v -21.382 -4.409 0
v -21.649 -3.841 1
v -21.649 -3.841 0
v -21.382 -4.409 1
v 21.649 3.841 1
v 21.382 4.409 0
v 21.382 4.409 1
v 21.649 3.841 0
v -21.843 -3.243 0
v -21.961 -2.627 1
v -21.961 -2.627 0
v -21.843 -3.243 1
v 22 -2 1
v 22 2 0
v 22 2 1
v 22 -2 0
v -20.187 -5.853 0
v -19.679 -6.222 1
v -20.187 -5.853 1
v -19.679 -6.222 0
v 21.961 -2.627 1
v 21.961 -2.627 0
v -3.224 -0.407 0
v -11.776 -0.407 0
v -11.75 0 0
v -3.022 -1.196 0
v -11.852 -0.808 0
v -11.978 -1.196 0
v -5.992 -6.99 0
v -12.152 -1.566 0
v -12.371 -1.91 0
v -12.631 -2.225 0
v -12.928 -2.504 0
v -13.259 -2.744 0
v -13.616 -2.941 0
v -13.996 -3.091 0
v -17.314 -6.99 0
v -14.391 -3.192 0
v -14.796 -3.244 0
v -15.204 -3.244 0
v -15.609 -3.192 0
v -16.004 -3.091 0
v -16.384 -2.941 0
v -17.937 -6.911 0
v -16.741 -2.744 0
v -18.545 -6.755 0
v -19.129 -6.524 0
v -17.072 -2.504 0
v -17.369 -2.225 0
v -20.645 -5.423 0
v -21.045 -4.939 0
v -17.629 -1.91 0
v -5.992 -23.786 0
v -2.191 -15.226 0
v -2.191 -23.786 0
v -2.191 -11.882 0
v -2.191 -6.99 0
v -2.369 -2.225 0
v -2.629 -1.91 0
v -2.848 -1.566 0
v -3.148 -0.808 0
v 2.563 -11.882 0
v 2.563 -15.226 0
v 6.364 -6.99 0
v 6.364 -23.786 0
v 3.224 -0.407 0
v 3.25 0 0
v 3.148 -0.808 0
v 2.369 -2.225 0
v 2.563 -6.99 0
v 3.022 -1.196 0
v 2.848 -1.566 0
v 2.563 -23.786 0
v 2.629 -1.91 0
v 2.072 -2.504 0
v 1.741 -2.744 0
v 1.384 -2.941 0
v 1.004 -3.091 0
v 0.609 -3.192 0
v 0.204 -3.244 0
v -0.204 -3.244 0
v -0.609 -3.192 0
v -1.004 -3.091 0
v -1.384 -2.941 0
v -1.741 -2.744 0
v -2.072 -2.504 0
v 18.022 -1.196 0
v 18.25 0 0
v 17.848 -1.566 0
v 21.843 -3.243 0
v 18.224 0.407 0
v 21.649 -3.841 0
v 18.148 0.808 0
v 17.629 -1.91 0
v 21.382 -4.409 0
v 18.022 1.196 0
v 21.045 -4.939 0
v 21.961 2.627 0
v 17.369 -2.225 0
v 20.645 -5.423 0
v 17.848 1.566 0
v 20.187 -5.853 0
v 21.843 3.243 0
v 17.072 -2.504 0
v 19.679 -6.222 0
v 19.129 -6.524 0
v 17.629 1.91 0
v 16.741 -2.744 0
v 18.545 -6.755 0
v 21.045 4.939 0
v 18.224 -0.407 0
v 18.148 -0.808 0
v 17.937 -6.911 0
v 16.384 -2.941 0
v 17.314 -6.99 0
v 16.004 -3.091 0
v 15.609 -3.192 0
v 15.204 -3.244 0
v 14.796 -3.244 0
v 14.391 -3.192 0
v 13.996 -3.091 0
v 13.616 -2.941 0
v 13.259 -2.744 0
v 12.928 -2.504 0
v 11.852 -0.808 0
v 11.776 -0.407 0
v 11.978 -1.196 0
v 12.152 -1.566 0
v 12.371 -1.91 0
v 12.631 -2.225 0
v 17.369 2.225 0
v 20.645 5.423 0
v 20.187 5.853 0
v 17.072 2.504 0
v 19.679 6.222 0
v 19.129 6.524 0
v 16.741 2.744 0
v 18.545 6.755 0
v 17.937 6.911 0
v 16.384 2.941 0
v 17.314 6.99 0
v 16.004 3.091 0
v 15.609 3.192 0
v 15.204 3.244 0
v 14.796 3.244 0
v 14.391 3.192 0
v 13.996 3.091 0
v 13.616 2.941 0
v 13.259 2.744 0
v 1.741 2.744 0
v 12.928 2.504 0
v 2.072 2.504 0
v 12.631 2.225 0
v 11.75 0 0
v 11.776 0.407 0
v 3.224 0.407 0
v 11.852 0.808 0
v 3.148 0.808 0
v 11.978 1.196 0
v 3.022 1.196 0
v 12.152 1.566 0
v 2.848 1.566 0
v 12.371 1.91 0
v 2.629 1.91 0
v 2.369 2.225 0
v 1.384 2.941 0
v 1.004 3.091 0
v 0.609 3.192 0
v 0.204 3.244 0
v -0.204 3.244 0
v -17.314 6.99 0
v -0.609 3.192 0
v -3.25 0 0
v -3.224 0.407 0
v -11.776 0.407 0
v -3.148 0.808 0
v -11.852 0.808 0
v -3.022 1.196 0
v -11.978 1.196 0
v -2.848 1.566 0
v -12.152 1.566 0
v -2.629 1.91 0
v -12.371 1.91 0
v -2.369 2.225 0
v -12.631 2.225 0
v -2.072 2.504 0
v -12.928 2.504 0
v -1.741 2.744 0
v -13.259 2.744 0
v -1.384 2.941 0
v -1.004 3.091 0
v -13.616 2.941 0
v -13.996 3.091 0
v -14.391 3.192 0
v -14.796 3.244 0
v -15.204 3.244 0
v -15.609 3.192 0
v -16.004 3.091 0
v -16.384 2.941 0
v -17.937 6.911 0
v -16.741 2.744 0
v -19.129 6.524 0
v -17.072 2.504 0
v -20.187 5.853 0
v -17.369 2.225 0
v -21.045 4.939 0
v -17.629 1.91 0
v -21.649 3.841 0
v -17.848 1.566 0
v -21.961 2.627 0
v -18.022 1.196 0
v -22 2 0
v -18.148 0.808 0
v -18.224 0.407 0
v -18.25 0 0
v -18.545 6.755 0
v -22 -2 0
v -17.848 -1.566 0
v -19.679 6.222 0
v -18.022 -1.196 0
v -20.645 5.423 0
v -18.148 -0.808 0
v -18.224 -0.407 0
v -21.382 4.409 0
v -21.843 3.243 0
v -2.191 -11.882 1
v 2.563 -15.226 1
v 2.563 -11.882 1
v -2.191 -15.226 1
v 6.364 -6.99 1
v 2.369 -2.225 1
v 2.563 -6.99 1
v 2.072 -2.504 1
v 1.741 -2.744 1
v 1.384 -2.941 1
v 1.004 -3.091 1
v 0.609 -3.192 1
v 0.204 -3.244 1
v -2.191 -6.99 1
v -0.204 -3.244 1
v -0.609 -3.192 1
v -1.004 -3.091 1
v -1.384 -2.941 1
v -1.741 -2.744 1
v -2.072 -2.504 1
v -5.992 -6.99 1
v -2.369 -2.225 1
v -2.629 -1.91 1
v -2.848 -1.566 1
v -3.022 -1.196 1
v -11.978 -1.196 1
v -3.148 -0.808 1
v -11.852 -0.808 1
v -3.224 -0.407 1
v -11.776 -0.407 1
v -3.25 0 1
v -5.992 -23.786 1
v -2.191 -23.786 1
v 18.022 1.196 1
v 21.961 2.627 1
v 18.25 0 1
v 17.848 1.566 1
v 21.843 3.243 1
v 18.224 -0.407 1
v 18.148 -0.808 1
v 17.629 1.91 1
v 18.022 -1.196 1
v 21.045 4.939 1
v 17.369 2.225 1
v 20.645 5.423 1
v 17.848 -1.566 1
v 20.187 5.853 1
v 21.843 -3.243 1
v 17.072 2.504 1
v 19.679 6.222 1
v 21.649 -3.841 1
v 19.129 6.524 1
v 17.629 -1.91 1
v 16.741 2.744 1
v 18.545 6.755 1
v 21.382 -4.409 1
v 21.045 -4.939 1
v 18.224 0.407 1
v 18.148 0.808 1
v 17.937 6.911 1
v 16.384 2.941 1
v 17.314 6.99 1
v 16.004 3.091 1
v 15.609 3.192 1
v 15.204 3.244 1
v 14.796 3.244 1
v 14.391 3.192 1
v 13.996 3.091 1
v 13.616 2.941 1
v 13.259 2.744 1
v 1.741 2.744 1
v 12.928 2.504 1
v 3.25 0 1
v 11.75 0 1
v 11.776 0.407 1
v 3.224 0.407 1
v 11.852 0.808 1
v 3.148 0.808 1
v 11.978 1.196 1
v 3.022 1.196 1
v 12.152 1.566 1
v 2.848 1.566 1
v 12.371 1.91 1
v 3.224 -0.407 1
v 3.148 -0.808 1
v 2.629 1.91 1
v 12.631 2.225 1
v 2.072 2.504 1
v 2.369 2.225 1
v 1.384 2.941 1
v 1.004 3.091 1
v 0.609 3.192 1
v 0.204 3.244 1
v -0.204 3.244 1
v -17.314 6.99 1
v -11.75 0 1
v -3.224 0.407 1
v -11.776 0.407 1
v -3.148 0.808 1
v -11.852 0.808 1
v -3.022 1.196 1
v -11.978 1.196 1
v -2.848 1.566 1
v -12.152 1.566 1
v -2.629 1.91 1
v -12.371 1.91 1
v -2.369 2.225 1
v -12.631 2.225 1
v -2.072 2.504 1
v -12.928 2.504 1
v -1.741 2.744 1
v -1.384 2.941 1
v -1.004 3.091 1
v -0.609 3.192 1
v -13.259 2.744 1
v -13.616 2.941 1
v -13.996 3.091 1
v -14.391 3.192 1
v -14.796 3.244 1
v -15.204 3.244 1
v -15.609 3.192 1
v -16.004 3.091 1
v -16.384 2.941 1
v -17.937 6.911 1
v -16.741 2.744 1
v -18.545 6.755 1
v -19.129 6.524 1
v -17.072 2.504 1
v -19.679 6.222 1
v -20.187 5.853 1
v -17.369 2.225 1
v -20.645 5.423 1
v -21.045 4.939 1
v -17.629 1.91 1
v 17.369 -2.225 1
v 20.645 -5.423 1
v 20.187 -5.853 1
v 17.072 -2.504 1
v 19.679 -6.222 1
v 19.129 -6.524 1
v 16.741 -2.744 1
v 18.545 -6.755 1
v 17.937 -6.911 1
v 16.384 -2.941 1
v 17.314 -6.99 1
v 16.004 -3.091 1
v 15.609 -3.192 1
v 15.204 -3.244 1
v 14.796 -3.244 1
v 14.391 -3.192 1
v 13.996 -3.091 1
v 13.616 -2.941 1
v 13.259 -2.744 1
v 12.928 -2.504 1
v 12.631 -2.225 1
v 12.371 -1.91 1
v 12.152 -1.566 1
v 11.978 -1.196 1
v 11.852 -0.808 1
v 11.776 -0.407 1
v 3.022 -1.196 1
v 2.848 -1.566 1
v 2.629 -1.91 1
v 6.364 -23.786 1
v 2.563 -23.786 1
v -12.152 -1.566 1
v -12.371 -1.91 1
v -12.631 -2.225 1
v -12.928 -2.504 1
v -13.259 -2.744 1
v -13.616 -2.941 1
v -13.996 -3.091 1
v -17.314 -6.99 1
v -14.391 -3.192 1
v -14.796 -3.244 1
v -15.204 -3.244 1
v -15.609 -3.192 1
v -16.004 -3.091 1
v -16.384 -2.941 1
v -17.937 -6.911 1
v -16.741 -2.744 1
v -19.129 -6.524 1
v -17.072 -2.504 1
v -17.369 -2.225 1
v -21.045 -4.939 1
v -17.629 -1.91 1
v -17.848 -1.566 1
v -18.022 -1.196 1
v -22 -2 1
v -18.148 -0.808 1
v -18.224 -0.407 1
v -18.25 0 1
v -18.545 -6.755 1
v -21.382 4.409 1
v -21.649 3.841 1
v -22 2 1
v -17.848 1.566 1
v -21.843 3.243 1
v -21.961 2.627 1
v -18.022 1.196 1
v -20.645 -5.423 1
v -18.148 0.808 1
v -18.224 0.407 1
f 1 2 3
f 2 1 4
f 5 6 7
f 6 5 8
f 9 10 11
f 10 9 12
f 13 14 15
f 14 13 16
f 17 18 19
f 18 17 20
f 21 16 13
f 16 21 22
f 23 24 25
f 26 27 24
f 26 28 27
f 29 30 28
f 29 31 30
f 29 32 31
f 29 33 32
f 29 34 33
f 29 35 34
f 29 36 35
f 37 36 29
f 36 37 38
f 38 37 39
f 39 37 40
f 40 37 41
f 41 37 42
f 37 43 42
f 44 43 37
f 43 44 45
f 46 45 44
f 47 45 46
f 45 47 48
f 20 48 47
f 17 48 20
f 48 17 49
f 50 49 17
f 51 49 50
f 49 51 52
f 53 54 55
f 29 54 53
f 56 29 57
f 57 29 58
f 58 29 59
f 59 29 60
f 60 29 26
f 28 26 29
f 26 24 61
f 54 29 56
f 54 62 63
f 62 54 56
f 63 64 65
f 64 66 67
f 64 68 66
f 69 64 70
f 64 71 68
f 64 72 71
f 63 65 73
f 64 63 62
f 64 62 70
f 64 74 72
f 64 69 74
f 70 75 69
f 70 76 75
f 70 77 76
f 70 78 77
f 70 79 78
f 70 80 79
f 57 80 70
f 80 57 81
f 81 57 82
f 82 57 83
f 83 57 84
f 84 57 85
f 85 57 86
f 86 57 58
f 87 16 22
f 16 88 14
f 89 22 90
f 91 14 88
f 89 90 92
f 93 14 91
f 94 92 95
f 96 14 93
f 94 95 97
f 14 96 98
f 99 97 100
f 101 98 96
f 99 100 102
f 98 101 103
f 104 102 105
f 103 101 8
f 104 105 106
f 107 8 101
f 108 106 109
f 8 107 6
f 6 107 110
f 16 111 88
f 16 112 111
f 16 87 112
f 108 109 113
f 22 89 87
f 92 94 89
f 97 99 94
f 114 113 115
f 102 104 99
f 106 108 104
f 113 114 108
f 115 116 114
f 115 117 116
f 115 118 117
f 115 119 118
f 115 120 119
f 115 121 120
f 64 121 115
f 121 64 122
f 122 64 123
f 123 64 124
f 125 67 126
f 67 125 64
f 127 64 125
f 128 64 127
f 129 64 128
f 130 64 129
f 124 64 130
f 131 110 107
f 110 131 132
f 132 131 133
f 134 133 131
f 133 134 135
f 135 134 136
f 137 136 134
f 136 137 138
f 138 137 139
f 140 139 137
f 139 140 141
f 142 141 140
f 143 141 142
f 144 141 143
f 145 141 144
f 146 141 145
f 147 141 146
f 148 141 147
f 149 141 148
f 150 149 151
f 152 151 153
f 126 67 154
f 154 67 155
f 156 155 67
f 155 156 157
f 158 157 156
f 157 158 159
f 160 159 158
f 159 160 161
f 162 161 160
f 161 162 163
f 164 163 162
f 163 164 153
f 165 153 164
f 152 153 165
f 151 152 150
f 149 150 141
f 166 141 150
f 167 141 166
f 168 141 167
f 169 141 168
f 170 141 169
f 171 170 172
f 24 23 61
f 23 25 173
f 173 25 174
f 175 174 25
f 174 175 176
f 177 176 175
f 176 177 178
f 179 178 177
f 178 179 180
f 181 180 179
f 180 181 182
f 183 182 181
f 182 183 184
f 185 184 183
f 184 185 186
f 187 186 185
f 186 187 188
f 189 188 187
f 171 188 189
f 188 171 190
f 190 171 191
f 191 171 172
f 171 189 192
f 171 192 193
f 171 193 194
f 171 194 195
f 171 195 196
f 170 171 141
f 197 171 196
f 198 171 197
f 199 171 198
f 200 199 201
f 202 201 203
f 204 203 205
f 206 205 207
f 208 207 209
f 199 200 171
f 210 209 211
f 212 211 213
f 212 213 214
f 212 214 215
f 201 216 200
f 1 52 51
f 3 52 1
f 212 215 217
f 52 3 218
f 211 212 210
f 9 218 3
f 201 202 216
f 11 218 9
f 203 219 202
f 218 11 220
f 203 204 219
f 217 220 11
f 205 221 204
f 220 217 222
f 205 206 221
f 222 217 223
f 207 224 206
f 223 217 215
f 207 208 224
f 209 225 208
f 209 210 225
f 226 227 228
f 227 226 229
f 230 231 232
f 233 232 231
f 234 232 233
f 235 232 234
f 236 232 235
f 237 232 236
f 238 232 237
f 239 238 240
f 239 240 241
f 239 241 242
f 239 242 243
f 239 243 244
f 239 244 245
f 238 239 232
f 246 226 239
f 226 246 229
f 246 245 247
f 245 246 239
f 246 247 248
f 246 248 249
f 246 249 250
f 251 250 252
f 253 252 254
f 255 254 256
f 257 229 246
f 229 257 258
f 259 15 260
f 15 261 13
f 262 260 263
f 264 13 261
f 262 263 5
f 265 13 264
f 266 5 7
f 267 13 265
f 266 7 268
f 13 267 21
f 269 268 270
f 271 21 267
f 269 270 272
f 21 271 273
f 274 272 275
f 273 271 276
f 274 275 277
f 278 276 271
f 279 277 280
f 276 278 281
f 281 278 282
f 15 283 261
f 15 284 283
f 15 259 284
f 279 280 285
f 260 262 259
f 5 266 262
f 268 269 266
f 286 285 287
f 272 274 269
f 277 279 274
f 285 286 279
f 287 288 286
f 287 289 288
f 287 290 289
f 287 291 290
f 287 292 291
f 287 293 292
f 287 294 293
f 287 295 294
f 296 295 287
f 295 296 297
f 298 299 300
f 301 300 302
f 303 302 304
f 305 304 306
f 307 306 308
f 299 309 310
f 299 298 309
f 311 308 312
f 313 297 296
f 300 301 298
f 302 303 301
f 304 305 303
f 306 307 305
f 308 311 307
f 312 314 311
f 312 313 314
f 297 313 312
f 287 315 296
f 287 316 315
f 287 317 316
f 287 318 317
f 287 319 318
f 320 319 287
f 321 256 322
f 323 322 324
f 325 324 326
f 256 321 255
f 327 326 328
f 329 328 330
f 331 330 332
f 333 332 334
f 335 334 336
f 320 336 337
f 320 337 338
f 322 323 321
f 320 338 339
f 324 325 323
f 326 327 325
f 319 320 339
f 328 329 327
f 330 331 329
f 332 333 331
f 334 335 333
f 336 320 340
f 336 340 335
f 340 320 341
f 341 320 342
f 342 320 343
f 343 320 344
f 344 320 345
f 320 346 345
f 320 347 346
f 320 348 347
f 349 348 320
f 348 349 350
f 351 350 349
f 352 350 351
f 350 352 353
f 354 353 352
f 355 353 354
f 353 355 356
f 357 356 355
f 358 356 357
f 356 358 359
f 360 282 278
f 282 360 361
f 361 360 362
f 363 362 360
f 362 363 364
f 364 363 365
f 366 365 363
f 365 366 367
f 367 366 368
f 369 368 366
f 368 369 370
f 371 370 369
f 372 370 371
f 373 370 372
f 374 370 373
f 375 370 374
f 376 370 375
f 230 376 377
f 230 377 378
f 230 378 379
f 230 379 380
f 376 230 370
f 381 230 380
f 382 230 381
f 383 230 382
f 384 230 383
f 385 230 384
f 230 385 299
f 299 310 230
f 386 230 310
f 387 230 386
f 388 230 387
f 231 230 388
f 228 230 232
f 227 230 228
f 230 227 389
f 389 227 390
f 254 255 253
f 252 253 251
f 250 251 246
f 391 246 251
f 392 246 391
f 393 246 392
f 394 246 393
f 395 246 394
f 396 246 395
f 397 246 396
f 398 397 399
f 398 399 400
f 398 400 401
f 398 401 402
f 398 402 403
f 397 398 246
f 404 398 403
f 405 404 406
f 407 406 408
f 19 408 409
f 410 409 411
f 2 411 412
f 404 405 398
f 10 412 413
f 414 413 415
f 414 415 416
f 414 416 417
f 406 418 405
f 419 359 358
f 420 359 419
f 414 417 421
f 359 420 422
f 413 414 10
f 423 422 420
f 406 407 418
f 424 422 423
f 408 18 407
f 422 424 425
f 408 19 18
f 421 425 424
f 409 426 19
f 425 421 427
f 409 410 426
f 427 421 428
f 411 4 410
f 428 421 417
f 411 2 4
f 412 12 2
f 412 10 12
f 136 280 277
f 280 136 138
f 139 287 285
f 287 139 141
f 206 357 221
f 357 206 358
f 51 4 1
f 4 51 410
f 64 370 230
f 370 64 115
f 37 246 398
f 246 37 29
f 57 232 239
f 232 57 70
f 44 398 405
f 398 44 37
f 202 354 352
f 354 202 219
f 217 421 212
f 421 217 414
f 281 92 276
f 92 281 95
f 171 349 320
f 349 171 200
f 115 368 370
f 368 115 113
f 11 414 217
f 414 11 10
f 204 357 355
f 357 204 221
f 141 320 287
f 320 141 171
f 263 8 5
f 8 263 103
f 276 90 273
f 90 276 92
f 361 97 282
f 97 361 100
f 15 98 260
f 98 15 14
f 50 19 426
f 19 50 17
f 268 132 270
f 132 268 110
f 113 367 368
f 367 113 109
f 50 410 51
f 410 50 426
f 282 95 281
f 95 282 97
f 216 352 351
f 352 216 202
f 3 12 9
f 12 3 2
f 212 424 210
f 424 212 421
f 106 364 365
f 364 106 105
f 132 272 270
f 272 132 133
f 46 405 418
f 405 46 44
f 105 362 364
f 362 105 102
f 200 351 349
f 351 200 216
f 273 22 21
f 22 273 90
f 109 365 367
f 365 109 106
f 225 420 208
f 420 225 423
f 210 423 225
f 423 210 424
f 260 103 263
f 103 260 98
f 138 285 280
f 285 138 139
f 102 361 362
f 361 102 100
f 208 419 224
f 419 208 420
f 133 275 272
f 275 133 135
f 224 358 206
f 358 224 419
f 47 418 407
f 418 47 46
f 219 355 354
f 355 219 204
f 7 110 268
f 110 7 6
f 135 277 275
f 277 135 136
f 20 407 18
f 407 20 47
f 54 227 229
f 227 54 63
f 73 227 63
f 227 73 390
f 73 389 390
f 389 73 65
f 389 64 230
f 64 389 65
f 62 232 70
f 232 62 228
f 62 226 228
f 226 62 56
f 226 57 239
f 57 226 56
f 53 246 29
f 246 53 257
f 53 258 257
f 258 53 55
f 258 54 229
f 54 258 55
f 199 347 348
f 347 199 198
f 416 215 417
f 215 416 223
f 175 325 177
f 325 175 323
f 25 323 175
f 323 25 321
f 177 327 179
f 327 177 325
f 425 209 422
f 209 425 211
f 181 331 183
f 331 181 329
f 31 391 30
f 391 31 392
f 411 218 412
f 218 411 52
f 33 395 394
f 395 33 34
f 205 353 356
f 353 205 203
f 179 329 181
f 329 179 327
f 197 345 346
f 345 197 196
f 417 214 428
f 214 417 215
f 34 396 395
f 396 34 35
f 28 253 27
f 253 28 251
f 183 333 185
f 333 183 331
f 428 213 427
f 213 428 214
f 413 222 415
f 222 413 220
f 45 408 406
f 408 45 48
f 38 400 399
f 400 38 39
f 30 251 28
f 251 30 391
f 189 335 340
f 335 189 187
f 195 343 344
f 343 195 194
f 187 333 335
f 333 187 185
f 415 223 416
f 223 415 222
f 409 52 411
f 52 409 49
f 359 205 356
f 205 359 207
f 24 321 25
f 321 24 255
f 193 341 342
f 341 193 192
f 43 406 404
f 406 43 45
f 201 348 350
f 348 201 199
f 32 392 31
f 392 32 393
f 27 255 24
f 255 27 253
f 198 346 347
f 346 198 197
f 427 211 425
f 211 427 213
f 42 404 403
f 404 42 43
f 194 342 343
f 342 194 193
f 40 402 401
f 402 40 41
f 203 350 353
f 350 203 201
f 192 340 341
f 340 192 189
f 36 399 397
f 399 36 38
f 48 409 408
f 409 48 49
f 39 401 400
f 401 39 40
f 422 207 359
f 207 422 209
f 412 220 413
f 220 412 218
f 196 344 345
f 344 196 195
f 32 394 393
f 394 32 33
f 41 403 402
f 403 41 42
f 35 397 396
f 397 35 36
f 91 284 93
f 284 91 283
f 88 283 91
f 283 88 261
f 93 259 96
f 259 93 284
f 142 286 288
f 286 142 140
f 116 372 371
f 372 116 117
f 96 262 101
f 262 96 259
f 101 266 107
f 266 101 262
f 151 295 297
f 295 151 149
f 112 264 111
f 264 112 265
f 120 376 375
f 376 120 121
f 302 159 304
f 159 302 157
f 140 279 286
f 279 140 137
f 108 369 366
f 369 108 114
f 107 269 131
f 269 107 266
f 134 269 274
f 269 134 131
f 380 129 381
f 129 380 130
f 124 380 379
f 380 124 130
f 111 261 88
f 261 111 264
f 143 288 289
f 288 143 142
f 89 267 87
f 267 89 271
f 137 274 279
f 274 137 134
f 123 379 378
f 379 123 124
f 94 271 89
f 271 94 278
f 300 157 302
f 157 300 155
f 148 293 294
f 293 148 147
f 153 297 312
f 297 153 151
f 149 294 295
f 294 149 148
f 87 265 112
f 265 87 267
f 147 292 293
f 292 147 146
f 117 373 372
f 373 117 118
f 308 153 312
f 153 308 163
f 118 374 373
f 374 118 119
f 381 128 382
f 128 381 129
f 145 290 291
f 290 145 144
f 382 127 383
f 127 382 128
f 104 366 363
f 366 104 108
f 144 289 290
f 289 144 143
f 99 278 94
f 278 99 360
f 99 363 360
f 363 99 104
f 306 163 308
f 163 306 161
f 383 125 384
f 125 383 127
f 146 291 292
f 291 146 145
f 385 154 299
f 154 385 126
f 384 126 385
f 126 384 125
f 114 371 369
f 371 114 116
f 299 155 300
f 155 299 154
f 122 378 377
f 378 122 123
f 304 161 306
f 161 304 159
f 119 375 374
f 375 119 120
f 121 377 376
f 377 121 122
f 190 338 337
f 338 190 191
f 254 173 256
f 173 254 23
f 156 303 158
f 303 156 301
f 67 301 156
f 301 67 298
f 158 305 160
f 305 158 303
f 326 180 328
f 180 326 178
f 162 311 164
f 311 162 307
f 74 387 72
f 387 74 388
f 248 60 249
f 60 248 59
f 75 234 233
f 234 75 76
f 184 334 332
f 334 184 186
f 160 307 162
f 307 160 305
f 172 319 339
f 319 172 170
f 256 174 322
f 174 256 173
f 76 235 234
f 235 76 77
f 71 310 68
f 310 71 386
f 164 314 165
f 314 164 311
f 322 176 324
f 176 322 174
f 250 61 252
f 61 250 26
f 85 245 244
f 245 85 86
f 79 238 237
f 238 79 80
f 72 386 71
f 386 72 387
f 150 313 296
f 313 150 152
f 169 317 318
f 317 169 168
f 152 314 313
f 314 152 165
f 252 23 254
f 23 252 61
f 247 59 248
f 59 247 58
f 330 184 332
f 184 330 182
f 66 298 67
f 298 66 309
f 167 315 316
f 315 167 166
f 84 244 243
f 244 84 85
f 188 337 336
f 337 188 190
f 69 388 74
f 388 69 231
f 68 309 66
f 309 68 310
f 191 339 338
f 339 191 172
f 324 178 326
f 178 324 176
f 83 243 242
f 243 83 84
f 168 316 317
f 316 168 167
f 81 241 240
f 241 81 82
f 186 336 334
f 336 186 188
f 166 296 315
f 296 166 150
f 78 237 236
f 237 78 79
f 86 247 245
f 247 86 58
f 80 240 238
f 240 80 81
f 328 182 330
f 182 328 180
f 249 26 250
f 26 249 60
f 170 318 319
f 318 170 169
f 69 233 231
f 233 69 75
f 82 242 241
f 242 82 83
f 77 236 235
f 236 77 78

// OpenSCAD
$fn = 50;


difference() {
	union() {
		translate(v = [0, 0, 0]) {
			rotate(a = [0, 0, 0]) {
				hull() {
					translate(v = [-17.0000000000, 2.0000000000, 0]) {
						rotate(a = [0, 0, 0]) {
							translate(v = [0, 0, 0]) {
								rotate(a = [0, 0, 0]) {
									cylinder(h = 1, r = 5);
								}
							}
						}
					}
					translate(v = [17.0000000000, 2.0000000000, 0]) {
						rotate(a = [0, 0, 0]) {
							translate(v = [0, 0, 0]) {
								rotate(a = [0, 0, 0]) {
									cylinder(h = 1, r = 5);
								}
							}
						}
					}
					translate(v = [-17.0000000000, -2.0000000000, 0]) {
						rotate(a = [0, 0, 0]) {
							translate(v = [0, 0, 0]) {
								rotate(a = [0, 0, 0]) {
									cylinder(h = 1, r = 5);
								}
							}
						}
					}
					translate(v = [17.0000000000, -2.0000000000, 0]) {
						rotate(a = [0, 0, 0]) {
							translate(v = [0, 0, 0]) {
								rotate(a = [0, 0, 0]) {
									cylinder(h = 1, r = 5);
								}
							}
						}
					}
				}
			}
		}
		translate(v = [0, -5, 0]) {
			rotate(a = [0, 0, 0]) {
				linear_extrude(height = 1) {
					text(font = "DejaVu Sans Mono:style=Bold", halign = "center", size = 19.0000000000, text = "H", valign = "top");
				}
			}
		}
	}
	union() {
		translate(v = [-15.0000000000, 0.0000000000, -125.0000000000]) {
			rotate(a = [0, 0, 0]) {
				cylinder(h = 250, r = 3.2500000000);
			}
		}
		translate(v = [15.0000000000, 0.0000000000, -125.0000000000]) {
			rotate(a = [0, 0, 0]) {
				cylinder(h = 250, r = 3.2500000000);
			}
		}
		translate(v = [15.0000000000, 0.0000000000, -125.0000000000]) {
			rotate(a = [0, 0, 0]) {
				cylinder(h = 250, r = 3.2500000000);
			}
		}
		translate(v = [0, 0, -125.0000000000]) {
			rotate(a = [0, 0, 0]) {
				cylinder(h = 250, r = 3.2500000000);
			}
		}
	}
}
